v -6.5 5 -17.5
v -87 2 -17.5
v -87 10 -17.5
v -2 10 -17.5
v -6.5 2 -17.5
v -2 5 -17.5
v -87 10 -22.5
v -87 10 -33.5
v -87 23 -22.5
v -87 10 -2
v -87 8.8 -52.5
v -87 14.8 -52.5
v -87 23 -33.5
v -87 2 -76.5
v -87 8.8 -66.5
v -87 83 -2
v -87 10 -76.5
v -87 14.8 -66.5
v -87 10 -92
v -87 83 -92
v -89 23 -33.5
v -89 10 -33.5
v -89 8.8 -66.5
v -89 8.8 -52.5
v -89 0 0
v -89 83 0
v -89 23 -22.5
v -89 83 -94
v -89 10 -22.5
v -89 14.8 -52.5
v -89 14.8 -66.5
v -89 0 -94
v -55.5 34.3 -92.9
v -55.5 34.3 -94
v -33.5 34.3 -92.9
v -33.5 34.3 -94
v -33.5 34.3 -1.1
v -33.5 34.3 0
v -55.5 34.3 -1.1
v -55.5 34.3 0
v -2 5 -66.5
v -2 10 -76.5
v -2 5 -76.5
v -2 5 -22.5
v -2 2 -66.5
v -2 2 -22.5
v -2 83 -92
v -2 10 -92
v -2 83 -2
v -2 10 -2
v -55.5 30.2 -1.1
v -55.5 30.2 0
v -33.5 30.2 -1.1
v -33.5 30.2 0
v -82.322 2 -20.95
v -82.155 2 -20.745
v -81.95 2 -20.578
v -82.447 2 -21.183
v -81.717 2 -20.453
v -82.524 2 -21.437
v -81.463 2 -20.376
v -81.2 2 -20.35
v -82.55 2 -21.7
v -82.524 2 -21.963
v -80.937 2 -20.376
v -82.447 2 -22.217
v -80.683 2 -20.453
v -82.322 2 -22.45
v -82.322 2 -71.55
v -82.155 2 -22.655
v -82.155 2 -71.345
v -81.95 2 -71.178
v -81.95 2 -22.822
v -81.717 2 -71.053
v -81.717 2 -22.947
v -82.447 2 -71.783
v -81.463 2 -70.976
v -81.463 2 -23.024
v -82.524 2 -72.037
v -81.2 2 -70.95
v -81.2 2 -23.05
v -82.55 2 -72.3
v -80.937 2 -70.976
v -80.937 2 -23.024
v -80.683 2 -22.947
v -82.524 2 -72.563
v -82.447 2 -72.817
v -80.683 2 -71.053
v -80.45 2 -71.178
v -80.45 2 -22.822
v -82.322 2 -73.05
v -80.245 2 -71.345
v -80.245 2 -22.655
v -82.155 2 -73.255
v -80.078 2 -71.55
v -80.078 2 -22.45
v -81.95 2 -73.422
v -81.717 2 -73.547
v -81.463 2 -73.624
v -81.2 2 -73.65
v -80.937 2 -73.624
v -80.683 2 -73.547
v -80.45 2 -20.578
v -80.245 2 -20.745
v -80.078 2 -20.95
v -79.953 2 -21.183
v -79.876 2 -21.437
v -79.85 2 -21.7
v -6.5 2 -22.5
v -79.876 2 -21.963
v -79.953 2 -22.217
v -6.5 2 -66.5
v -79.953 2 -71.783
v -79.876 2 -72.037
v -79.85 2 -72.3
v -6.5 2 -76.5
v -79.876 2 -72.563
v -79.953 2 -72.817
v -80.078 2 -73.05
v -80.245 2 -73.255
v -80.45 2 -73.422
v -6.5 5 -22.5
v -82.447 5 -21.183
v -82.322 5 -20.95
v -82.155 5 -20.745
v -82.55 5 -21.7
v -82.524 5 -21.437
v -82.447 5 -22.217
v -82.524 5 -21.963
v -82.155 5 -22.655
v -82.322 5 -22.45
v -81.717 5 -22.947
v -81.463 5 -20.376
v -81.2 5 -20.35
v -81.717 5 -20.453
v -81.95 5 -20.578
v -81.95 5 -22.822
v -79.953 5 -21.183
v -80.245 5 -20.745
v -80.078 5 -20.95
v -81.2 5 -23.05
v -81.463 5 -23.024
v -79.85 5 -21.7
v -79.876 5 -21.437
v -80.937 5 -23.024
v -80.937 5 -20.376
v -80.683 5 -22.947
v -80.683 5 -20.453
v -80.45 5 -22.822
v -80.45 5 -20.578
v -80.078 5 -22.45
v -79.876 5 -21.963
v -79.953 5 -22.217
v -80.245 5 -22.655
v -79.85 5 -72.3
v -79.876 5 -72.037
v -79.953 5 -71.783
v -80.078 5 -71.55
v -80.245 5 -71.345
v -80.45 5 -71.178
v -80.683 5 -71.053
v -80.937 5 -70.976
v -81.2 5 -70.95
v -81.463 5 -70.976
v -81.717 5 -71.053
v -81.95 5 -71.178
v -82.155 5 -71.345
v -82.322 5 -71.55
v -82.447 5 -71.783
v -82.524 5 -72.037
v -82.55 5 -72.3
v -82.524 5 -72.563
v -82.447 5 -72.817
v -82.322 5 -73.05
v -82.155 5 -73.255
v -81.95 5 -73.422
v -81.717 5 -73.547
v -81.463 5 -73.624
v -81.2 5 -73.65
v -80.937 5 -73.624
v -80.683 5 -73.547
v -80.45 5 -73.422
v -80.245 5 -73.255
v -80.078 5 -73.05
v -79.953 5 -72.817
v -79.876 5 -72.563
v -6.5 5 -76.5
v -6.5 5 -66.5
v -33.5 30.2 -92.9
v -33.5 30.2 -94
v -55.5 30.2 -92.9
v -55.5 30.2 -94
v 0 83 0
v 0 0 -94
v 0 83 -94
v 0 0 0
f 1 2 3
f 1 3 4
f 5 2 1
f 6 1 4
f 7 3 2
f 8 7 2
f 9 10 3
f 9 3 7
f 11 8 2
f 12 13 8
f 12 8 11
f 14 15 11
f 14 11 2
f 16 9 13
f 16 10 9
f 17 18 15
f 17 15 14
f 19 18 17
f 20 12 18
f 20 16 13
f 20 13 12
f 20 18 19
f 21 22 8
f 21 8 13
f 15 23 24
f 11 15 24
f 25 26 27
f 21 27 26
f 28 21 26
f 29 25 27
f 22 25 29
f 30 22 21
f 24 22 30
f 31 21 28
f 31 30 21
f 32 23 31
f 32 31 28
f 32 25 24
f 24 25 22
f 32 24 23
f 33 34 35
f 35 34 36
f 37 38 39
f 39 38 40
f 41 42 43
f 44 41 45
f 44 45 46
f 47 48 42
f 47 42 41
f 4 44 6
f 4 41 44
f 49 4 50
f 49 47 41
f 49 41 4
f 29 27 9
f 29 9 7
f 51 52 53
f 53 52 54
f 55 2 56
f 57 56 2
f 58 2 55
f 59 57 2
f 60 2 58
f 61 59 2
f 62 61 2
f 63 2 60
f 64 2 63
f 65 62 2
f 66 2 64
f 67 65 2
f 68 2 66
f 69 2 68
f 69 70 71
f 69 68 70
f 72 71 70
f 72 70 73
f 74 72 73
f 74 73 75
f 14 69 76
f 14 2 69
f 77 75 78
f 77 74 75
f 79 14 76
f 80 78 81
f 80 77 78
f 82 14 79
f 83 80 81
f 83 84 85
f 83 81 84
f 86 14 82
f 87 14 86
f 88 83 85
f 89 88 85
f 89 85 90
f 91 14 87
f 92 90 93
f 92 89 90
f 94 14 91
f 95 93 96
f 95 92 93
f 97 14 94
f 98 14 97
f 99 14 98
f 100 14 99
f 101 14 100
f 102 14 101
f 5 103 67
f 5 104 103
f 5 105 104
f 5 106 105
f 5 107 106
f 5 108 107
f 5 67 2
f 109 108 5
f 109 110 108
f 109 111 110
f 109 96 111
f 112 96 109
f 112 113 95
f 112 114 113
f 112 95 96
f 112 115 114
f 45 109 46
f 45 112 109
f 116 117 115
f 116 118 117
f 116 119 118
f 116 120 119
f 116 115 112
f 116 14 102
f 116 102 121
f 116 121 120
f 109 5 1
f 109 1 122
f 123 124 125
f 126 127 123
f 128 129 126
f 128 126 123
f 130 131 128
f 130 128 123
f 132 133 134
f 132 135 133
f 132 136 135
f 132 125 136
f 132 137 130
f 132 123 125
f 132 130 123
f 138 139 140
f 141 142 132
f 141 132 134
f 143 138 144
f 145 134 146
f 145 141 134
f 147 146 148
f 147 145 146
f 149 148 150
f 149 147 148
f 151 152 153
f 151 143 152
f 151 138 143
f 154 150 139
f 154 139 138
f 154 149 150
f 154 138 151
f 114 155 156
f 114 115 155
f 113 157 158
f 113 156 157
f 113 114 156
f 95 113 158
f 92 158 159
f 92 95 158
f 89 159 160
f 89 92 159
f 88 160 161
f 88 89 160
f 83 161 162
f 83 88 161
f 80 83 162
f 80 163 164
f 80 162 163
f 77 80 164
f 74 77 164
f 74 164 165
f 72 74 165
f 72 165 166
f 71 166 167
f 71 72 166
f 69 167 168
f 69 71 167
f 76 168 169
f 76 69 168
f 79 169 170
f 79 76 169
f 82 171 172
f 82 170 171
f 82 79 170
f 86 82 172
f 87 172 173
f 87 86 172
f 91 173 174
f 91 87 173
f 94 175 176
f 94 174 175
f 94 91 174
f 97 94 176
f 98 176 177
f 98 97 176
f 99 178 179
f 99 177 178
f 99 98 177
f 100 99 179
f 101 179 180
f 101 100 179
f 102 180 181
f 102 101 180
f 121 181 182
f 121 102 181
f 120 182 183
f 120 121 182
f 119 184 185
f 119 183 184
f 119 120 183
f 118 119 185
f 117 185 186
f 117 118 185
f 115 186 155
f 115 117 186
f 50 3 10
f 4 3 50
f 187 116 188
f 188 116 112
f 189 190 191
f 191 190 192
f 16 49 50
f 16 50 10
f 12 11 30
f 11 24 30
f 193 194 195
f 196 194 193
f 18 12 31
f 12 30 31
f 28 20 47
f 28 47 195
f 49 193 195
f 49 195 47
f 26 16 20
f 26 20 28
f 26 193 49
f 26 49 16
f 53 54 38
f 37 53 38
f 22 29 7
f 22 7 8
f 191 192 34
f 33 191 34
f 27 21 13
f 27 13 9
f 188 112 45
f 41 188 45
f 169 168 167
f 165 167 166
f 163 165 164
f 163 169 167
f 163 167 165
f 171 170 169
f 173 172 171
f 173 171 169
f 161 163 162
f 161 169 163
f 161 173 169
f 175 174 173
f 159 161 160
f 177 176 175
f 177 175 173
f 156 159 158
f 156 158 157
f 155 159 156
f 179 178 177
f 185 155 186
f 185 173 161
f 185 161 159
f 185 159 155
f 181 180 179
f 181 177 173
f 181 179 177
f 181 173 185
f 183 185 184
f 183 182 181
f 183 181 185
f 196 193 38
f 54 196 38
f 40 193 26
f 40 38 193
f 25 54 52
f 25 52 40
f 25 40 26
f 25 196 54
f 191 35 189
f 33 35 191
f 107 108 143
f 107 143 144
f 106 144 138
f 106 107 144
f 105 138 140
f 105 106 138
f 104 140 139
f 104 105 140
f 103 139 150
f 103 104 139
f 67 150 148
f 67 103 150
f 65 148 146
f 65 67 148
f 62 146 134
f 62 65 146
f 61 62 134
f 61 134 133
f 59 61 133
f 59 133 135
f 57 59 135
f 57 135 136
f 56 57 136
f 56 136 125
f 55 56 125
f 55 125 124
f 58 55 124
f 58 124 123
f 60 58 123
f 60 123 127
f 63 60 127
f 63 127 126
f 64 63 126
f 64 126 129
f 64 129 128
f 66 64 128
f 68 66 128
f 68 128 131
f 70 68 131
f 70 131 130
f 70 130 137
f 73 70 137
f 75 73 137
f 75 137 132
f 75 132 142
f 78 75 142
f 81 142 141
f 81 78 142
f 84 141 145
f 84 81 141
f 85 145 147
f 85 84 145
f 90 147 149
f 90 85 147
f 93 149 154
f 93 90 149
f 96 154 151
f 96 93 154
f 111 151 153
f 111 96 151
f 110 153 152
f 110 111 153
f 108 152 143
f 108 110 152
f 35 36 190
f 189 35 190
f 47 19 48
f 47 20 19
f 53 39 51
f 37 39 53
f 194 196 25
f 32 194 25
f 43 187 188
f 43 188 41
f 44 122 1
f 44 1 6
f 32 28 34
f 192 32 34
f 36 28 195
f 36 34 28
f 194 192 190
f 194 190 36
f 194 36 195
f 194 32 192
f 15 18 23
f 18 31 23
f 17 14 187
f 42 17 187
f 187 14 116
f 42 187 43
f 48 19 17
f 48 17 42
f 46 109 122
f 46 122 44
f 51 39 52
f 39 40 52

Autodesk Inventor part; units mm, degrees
ref_plane "YZ Plane" through (0, 0, 0) normal (1, 0, 0) x (0, 1, 0)
ref_plane "XZ Plane" through (0, 0, 0) normal (0, 1, 0) x (-1, 0, 0)
ref_plane "XY Plane" through (0, 0, 0) normal (0, 0, 1) x (1, 0, 0)
sketch "Sketch1" plane through (0, 0, 0) normal (0, 1, 0) x (-1, 0, 0)
  line L0 (0, 0) -> (89, 0)
  line L1 (89, 0) -> (89, -94)
  line L2 (89, -94) -> (0, -94)
  line L3 (0, -94) -> (0, 0)
  dimension "d0" = 89
  dimension "d1" = 94
extrude "Extrusion1" add sketch "Sketch1" along normal blind 83
sketch "Sketch2" plane through (0, 83, 0) normal (0, 1, 0) x (1, 0, 0)
  line L0 (0, 0) -> (0, 2) construction
  line L1 (0, 0) -> (0, 94) projected
  line L2 (0, 2) -> (-2, 2) construction
  line L3 (-2, 2) -> (-87, 2)
  line L4 (-87, 2) -> (-87, 92)
  line L5 (-87, 92) -> (-2, 92)
  line L6 (-2, 92) -> (-2, 2)
  dimension "d4" = 2
  dimension "d5" = 2
  dimension "d6" = 85
  dimension "d7" = 90
extrude "Extrusion2" cut sketch "Sketch2" against normal blind 81
sketch "Sketch3" plane through (0, 2, 0) normal (0, 1, 0) x (1, 0, 0)
  line L0 (-87, 2) -> (-87, 92) projected
  line L1 (-87, 2) -> (-76, 2)
  line L2 (-2, 2) -> (-87, 2) projected
  line L3 (-76, 2) -> (-17, 2)
  line L4 (-87, 92) -> (-2, 92) projected
  line L5 (-76, 2) -> (-87, 2)
  line L6 (-87, 2) -> (-87, 92)
  line L7 (-87, 92) -> (-76, 92)
  line L8 (-2, 92) -> (-2, 2) projected
  line L9 (-17, 2) -> (-2, 2)
  line L10 (-2, 2) -> (-2, 92)
  line L11 (-2, 92) -> (-17, 92)
  line L12 (-87, 2) -> (-87, 17.5)
  line L13 (-87, 17.5) -> (-87, 76.5)
  line L14 (-87, 17.5) -> (-2, 17.5)
  line L15 (-2, 17.5) -> (-2, 2)
  line L16 (-2, 2) -> (-87, 2)
  line L17 (-87, 2) -> (-87, 17.5)
  line L18 (-87, 76.5) -> (-2, 76.5)
  line L19 (-2, 76.5) -> (-2, 92)
  line L20 (-2, 92) -> (-87, 92)
  line L21 (-87, 92) -> (-87, 76.5)
  point P0 (0, 0)
  point P1 (-2, 76.5)
  point P2 (-2, 17.5)
  dimension "d26" = 15.5
  dimension "d27" = 59
extrude "Extrusion3" add sketch "Sketch3" along normal blind 8 contours L0 L14 L8 L2 L1 | L0 L4 L8 L18
sketch "Sketch4" plane through (0, 2, 0) normal (0, 1, 0) x (1, 0, 0)
  line L0 (-46.5, 2) -> (43.5, 2) construction
  line L1 (-2, 17.5) -> (-87, 17.5) projected
  line L2 (-2, 17.5) -> (-6.5, 17.5)
  line L3 (-6.5, 17.5) -> (-6.5, 22.5)
  line L4 (-6.5, 22.5) -> (-2, 22.5)
  line L5 (-2, 22.5) -> (-2, 17.5)
  line L6 (-2, 76.5) -> (-2, 17.5) projected
  line L7 (-2, 76.5) -> (-6.5, 76.5)
  line L8 (-6.5, 76.5) -> (-6.5, 66.5)
  line L9 (-6.5, 66.5) -> (-2, 66.5)
  line L10 (-2, 66.5) -> (-2, 76.5)
  line L11 (-87, 17.5) -> (-81.2, 17.5)
  line L12 (-81.2, 17.5) -> (-81.2, 21.7)
  line L13 (-81.2, 21.7) -> (-87, 21.7)
  line L14 (-87, 21.7) -> (-87, 17.5)
  circle A0 centre (-81.2, 21.7) radius 1.35
  line L15 (-87, 17.5) -> (-87, 76.5) projected
  line L16 (-87, 47) -> (-2, 47) construction
  circle A1 centre (-81.2, 72.3) radius 1.35
  point P0 (-76, 2)
  dimension "d28" = 4.5
  dimension "d29" = 5
  dimension "d30" = 4.5
  dimension "d31" = 10
  dimension "d32" = 5.8
  dimension "d33" = 4.2
  dimension "d34" = 2.7
extrude "Extrusion4" add sketch "Sketch4" along normal blind 3 contours L9 L8 L7 L6 | L1 L3 L4 L5 | A0 L13 L12 | L12 L13 A0 | A1
sketch "Sketch6" plane through (-89, 0, -94) normal (-1, 0, 0) x (0, 0, 1)
  line L0 (0, 0) -> (0, 83) projected
  line L1 (0, 0) -> (2, 0) construction
  line L2 (2, 0) -> (2, 2) construction
  line L3 (2, 2) -> (0, 2) construction
  line L4 (0, 2) -> (0, 0)
  line L5 (2, 2) -> (27.5, 2) construction
  line L6 (20.35, 2) -> (20.35, 5) projected
  line L7 (2, 2) -> (27.5, 2) construction
  line L8 (27.5, 2) -> (27.5, 8.8) construction
  line L9 (27.5, 2) -> (34.3, 2) construction
  line L10 (27.5, 8.8) -> (41.5, 8.8)
  line L11 (41.5, 8.8) -> (41.5, 14.8)
  line L12 (41.5, 14.8) -> (27.5, 14.8)
  line L13 (27.5, 14.8) -> (27.5, 8.8)
  line L14 (94, 0) -> (92, 0) construction
  line L15 (92, 0) -> (92, 2) construction
  line L16 (92, 2) -> (94, 2) construction
  line L17 (94, 2) -> (94, 0) construction
  line L18 (92, 2) -> (76.5, 2) construction
  line L19 (76.5, 2) -> (71.5, 2) construction
  line L20 (71.5, 2) -> (71.5, 10) construction
  line L21 (71.5, 10) -> (60.5, 10)
  line L22 (60.5, 10) -> (60.5, 23)
  line L23 (60.5, 23) -> (71.5, 23)
  line L24 (71.5, 23) -> (71.5, 10)
  dimension "d35" = 2
  dimension "d36" = 2
  dimension "d37" = 25.5
  dimension "d38" = 0
  dimension "d39" = 6.8
  dimension "d40" = 90
  dimension "d41" = 14
  dimension "d42" = 6
  dimension "d43" = 2
  dimension "d44" = 2
  dimension "d45" = 15.5
  dimension "d46" = 5
  dimension "d47" = 8
  dimension "d48" = 11
  dimension "d49" = 13
extrude "Extrusion5" cut sketch "Sketch6" against normal up to surface (2 mm away)
sketch "Sketch7" plane through (0, 0, -94) normal (0, 0, -1) x (-1, 0, 0)
  line L0 (89, 83) -> (55.5, 83)
  line L1 (55.5, 83) -> (55.5, 34.3)
  line L2 (55.5, 34.3) -> (89, 34.3)
  line L3 (89, 34.3) -> (89, 83)
  line L4 (55.5, 34.3) -> (33.5, 34.3)
  line L5 (33.5, 34.3) -> (33.5, 30.2)
  line L6 (33.5, 30.2) -> (55.5, 30.2)
  line L7 (55.5, 30.2) -> (55.5, 34.3)
  line L8 (0, 0) -> (0, 83) projected
  point P0 (33.5, 32.25)
  dimension "d52" = 33.5
  dimension "d53" = 48.7
  dimension "d54" = 22
  dimension "d55" = 4.1
  dimension "d61" = 33.5
extrude "Extrusion6" cut sketch "Sketch7" against normal blind 1.1 contours L7 L6 L5 L4
sketch "Sketch8" plane through (-89, 0, 0) normal (0, 0, 1) x (1, 0, 0)
  line L0 (89, 0) -> (89, 83) projected
  line L1 (89, 83) -> (55.5, 83)
  line L2 (55.5, 83) -> (55.5, 34.3)
  line L3 (55.5, 34.3) -> (89, 34.3)
  line L4 (89, 34.3) -> (89, 83)
  line L5 (33.5, 30.2) -> (55.5, 30.2) projected
  line L6 (55.5, 34.3) -> (33.5, 34.3)
  line L7 (33.5, 34.3) -> (33.5, 30.2)
  line L8 (33.5, 30.2) -> (55.5, 30.2)
  line L9 (55.5, 30.2) -> (55.5, 34.3)
  dimension "d62" = 33.5
  dimension "d63" = 48.7
  dimension "d64" = 22
extrude "Extrusion7" cut sketch "Sketch8" against normal blind 1.1 contours L9 L5 L7 L6
properties part number "Arduino_case"
